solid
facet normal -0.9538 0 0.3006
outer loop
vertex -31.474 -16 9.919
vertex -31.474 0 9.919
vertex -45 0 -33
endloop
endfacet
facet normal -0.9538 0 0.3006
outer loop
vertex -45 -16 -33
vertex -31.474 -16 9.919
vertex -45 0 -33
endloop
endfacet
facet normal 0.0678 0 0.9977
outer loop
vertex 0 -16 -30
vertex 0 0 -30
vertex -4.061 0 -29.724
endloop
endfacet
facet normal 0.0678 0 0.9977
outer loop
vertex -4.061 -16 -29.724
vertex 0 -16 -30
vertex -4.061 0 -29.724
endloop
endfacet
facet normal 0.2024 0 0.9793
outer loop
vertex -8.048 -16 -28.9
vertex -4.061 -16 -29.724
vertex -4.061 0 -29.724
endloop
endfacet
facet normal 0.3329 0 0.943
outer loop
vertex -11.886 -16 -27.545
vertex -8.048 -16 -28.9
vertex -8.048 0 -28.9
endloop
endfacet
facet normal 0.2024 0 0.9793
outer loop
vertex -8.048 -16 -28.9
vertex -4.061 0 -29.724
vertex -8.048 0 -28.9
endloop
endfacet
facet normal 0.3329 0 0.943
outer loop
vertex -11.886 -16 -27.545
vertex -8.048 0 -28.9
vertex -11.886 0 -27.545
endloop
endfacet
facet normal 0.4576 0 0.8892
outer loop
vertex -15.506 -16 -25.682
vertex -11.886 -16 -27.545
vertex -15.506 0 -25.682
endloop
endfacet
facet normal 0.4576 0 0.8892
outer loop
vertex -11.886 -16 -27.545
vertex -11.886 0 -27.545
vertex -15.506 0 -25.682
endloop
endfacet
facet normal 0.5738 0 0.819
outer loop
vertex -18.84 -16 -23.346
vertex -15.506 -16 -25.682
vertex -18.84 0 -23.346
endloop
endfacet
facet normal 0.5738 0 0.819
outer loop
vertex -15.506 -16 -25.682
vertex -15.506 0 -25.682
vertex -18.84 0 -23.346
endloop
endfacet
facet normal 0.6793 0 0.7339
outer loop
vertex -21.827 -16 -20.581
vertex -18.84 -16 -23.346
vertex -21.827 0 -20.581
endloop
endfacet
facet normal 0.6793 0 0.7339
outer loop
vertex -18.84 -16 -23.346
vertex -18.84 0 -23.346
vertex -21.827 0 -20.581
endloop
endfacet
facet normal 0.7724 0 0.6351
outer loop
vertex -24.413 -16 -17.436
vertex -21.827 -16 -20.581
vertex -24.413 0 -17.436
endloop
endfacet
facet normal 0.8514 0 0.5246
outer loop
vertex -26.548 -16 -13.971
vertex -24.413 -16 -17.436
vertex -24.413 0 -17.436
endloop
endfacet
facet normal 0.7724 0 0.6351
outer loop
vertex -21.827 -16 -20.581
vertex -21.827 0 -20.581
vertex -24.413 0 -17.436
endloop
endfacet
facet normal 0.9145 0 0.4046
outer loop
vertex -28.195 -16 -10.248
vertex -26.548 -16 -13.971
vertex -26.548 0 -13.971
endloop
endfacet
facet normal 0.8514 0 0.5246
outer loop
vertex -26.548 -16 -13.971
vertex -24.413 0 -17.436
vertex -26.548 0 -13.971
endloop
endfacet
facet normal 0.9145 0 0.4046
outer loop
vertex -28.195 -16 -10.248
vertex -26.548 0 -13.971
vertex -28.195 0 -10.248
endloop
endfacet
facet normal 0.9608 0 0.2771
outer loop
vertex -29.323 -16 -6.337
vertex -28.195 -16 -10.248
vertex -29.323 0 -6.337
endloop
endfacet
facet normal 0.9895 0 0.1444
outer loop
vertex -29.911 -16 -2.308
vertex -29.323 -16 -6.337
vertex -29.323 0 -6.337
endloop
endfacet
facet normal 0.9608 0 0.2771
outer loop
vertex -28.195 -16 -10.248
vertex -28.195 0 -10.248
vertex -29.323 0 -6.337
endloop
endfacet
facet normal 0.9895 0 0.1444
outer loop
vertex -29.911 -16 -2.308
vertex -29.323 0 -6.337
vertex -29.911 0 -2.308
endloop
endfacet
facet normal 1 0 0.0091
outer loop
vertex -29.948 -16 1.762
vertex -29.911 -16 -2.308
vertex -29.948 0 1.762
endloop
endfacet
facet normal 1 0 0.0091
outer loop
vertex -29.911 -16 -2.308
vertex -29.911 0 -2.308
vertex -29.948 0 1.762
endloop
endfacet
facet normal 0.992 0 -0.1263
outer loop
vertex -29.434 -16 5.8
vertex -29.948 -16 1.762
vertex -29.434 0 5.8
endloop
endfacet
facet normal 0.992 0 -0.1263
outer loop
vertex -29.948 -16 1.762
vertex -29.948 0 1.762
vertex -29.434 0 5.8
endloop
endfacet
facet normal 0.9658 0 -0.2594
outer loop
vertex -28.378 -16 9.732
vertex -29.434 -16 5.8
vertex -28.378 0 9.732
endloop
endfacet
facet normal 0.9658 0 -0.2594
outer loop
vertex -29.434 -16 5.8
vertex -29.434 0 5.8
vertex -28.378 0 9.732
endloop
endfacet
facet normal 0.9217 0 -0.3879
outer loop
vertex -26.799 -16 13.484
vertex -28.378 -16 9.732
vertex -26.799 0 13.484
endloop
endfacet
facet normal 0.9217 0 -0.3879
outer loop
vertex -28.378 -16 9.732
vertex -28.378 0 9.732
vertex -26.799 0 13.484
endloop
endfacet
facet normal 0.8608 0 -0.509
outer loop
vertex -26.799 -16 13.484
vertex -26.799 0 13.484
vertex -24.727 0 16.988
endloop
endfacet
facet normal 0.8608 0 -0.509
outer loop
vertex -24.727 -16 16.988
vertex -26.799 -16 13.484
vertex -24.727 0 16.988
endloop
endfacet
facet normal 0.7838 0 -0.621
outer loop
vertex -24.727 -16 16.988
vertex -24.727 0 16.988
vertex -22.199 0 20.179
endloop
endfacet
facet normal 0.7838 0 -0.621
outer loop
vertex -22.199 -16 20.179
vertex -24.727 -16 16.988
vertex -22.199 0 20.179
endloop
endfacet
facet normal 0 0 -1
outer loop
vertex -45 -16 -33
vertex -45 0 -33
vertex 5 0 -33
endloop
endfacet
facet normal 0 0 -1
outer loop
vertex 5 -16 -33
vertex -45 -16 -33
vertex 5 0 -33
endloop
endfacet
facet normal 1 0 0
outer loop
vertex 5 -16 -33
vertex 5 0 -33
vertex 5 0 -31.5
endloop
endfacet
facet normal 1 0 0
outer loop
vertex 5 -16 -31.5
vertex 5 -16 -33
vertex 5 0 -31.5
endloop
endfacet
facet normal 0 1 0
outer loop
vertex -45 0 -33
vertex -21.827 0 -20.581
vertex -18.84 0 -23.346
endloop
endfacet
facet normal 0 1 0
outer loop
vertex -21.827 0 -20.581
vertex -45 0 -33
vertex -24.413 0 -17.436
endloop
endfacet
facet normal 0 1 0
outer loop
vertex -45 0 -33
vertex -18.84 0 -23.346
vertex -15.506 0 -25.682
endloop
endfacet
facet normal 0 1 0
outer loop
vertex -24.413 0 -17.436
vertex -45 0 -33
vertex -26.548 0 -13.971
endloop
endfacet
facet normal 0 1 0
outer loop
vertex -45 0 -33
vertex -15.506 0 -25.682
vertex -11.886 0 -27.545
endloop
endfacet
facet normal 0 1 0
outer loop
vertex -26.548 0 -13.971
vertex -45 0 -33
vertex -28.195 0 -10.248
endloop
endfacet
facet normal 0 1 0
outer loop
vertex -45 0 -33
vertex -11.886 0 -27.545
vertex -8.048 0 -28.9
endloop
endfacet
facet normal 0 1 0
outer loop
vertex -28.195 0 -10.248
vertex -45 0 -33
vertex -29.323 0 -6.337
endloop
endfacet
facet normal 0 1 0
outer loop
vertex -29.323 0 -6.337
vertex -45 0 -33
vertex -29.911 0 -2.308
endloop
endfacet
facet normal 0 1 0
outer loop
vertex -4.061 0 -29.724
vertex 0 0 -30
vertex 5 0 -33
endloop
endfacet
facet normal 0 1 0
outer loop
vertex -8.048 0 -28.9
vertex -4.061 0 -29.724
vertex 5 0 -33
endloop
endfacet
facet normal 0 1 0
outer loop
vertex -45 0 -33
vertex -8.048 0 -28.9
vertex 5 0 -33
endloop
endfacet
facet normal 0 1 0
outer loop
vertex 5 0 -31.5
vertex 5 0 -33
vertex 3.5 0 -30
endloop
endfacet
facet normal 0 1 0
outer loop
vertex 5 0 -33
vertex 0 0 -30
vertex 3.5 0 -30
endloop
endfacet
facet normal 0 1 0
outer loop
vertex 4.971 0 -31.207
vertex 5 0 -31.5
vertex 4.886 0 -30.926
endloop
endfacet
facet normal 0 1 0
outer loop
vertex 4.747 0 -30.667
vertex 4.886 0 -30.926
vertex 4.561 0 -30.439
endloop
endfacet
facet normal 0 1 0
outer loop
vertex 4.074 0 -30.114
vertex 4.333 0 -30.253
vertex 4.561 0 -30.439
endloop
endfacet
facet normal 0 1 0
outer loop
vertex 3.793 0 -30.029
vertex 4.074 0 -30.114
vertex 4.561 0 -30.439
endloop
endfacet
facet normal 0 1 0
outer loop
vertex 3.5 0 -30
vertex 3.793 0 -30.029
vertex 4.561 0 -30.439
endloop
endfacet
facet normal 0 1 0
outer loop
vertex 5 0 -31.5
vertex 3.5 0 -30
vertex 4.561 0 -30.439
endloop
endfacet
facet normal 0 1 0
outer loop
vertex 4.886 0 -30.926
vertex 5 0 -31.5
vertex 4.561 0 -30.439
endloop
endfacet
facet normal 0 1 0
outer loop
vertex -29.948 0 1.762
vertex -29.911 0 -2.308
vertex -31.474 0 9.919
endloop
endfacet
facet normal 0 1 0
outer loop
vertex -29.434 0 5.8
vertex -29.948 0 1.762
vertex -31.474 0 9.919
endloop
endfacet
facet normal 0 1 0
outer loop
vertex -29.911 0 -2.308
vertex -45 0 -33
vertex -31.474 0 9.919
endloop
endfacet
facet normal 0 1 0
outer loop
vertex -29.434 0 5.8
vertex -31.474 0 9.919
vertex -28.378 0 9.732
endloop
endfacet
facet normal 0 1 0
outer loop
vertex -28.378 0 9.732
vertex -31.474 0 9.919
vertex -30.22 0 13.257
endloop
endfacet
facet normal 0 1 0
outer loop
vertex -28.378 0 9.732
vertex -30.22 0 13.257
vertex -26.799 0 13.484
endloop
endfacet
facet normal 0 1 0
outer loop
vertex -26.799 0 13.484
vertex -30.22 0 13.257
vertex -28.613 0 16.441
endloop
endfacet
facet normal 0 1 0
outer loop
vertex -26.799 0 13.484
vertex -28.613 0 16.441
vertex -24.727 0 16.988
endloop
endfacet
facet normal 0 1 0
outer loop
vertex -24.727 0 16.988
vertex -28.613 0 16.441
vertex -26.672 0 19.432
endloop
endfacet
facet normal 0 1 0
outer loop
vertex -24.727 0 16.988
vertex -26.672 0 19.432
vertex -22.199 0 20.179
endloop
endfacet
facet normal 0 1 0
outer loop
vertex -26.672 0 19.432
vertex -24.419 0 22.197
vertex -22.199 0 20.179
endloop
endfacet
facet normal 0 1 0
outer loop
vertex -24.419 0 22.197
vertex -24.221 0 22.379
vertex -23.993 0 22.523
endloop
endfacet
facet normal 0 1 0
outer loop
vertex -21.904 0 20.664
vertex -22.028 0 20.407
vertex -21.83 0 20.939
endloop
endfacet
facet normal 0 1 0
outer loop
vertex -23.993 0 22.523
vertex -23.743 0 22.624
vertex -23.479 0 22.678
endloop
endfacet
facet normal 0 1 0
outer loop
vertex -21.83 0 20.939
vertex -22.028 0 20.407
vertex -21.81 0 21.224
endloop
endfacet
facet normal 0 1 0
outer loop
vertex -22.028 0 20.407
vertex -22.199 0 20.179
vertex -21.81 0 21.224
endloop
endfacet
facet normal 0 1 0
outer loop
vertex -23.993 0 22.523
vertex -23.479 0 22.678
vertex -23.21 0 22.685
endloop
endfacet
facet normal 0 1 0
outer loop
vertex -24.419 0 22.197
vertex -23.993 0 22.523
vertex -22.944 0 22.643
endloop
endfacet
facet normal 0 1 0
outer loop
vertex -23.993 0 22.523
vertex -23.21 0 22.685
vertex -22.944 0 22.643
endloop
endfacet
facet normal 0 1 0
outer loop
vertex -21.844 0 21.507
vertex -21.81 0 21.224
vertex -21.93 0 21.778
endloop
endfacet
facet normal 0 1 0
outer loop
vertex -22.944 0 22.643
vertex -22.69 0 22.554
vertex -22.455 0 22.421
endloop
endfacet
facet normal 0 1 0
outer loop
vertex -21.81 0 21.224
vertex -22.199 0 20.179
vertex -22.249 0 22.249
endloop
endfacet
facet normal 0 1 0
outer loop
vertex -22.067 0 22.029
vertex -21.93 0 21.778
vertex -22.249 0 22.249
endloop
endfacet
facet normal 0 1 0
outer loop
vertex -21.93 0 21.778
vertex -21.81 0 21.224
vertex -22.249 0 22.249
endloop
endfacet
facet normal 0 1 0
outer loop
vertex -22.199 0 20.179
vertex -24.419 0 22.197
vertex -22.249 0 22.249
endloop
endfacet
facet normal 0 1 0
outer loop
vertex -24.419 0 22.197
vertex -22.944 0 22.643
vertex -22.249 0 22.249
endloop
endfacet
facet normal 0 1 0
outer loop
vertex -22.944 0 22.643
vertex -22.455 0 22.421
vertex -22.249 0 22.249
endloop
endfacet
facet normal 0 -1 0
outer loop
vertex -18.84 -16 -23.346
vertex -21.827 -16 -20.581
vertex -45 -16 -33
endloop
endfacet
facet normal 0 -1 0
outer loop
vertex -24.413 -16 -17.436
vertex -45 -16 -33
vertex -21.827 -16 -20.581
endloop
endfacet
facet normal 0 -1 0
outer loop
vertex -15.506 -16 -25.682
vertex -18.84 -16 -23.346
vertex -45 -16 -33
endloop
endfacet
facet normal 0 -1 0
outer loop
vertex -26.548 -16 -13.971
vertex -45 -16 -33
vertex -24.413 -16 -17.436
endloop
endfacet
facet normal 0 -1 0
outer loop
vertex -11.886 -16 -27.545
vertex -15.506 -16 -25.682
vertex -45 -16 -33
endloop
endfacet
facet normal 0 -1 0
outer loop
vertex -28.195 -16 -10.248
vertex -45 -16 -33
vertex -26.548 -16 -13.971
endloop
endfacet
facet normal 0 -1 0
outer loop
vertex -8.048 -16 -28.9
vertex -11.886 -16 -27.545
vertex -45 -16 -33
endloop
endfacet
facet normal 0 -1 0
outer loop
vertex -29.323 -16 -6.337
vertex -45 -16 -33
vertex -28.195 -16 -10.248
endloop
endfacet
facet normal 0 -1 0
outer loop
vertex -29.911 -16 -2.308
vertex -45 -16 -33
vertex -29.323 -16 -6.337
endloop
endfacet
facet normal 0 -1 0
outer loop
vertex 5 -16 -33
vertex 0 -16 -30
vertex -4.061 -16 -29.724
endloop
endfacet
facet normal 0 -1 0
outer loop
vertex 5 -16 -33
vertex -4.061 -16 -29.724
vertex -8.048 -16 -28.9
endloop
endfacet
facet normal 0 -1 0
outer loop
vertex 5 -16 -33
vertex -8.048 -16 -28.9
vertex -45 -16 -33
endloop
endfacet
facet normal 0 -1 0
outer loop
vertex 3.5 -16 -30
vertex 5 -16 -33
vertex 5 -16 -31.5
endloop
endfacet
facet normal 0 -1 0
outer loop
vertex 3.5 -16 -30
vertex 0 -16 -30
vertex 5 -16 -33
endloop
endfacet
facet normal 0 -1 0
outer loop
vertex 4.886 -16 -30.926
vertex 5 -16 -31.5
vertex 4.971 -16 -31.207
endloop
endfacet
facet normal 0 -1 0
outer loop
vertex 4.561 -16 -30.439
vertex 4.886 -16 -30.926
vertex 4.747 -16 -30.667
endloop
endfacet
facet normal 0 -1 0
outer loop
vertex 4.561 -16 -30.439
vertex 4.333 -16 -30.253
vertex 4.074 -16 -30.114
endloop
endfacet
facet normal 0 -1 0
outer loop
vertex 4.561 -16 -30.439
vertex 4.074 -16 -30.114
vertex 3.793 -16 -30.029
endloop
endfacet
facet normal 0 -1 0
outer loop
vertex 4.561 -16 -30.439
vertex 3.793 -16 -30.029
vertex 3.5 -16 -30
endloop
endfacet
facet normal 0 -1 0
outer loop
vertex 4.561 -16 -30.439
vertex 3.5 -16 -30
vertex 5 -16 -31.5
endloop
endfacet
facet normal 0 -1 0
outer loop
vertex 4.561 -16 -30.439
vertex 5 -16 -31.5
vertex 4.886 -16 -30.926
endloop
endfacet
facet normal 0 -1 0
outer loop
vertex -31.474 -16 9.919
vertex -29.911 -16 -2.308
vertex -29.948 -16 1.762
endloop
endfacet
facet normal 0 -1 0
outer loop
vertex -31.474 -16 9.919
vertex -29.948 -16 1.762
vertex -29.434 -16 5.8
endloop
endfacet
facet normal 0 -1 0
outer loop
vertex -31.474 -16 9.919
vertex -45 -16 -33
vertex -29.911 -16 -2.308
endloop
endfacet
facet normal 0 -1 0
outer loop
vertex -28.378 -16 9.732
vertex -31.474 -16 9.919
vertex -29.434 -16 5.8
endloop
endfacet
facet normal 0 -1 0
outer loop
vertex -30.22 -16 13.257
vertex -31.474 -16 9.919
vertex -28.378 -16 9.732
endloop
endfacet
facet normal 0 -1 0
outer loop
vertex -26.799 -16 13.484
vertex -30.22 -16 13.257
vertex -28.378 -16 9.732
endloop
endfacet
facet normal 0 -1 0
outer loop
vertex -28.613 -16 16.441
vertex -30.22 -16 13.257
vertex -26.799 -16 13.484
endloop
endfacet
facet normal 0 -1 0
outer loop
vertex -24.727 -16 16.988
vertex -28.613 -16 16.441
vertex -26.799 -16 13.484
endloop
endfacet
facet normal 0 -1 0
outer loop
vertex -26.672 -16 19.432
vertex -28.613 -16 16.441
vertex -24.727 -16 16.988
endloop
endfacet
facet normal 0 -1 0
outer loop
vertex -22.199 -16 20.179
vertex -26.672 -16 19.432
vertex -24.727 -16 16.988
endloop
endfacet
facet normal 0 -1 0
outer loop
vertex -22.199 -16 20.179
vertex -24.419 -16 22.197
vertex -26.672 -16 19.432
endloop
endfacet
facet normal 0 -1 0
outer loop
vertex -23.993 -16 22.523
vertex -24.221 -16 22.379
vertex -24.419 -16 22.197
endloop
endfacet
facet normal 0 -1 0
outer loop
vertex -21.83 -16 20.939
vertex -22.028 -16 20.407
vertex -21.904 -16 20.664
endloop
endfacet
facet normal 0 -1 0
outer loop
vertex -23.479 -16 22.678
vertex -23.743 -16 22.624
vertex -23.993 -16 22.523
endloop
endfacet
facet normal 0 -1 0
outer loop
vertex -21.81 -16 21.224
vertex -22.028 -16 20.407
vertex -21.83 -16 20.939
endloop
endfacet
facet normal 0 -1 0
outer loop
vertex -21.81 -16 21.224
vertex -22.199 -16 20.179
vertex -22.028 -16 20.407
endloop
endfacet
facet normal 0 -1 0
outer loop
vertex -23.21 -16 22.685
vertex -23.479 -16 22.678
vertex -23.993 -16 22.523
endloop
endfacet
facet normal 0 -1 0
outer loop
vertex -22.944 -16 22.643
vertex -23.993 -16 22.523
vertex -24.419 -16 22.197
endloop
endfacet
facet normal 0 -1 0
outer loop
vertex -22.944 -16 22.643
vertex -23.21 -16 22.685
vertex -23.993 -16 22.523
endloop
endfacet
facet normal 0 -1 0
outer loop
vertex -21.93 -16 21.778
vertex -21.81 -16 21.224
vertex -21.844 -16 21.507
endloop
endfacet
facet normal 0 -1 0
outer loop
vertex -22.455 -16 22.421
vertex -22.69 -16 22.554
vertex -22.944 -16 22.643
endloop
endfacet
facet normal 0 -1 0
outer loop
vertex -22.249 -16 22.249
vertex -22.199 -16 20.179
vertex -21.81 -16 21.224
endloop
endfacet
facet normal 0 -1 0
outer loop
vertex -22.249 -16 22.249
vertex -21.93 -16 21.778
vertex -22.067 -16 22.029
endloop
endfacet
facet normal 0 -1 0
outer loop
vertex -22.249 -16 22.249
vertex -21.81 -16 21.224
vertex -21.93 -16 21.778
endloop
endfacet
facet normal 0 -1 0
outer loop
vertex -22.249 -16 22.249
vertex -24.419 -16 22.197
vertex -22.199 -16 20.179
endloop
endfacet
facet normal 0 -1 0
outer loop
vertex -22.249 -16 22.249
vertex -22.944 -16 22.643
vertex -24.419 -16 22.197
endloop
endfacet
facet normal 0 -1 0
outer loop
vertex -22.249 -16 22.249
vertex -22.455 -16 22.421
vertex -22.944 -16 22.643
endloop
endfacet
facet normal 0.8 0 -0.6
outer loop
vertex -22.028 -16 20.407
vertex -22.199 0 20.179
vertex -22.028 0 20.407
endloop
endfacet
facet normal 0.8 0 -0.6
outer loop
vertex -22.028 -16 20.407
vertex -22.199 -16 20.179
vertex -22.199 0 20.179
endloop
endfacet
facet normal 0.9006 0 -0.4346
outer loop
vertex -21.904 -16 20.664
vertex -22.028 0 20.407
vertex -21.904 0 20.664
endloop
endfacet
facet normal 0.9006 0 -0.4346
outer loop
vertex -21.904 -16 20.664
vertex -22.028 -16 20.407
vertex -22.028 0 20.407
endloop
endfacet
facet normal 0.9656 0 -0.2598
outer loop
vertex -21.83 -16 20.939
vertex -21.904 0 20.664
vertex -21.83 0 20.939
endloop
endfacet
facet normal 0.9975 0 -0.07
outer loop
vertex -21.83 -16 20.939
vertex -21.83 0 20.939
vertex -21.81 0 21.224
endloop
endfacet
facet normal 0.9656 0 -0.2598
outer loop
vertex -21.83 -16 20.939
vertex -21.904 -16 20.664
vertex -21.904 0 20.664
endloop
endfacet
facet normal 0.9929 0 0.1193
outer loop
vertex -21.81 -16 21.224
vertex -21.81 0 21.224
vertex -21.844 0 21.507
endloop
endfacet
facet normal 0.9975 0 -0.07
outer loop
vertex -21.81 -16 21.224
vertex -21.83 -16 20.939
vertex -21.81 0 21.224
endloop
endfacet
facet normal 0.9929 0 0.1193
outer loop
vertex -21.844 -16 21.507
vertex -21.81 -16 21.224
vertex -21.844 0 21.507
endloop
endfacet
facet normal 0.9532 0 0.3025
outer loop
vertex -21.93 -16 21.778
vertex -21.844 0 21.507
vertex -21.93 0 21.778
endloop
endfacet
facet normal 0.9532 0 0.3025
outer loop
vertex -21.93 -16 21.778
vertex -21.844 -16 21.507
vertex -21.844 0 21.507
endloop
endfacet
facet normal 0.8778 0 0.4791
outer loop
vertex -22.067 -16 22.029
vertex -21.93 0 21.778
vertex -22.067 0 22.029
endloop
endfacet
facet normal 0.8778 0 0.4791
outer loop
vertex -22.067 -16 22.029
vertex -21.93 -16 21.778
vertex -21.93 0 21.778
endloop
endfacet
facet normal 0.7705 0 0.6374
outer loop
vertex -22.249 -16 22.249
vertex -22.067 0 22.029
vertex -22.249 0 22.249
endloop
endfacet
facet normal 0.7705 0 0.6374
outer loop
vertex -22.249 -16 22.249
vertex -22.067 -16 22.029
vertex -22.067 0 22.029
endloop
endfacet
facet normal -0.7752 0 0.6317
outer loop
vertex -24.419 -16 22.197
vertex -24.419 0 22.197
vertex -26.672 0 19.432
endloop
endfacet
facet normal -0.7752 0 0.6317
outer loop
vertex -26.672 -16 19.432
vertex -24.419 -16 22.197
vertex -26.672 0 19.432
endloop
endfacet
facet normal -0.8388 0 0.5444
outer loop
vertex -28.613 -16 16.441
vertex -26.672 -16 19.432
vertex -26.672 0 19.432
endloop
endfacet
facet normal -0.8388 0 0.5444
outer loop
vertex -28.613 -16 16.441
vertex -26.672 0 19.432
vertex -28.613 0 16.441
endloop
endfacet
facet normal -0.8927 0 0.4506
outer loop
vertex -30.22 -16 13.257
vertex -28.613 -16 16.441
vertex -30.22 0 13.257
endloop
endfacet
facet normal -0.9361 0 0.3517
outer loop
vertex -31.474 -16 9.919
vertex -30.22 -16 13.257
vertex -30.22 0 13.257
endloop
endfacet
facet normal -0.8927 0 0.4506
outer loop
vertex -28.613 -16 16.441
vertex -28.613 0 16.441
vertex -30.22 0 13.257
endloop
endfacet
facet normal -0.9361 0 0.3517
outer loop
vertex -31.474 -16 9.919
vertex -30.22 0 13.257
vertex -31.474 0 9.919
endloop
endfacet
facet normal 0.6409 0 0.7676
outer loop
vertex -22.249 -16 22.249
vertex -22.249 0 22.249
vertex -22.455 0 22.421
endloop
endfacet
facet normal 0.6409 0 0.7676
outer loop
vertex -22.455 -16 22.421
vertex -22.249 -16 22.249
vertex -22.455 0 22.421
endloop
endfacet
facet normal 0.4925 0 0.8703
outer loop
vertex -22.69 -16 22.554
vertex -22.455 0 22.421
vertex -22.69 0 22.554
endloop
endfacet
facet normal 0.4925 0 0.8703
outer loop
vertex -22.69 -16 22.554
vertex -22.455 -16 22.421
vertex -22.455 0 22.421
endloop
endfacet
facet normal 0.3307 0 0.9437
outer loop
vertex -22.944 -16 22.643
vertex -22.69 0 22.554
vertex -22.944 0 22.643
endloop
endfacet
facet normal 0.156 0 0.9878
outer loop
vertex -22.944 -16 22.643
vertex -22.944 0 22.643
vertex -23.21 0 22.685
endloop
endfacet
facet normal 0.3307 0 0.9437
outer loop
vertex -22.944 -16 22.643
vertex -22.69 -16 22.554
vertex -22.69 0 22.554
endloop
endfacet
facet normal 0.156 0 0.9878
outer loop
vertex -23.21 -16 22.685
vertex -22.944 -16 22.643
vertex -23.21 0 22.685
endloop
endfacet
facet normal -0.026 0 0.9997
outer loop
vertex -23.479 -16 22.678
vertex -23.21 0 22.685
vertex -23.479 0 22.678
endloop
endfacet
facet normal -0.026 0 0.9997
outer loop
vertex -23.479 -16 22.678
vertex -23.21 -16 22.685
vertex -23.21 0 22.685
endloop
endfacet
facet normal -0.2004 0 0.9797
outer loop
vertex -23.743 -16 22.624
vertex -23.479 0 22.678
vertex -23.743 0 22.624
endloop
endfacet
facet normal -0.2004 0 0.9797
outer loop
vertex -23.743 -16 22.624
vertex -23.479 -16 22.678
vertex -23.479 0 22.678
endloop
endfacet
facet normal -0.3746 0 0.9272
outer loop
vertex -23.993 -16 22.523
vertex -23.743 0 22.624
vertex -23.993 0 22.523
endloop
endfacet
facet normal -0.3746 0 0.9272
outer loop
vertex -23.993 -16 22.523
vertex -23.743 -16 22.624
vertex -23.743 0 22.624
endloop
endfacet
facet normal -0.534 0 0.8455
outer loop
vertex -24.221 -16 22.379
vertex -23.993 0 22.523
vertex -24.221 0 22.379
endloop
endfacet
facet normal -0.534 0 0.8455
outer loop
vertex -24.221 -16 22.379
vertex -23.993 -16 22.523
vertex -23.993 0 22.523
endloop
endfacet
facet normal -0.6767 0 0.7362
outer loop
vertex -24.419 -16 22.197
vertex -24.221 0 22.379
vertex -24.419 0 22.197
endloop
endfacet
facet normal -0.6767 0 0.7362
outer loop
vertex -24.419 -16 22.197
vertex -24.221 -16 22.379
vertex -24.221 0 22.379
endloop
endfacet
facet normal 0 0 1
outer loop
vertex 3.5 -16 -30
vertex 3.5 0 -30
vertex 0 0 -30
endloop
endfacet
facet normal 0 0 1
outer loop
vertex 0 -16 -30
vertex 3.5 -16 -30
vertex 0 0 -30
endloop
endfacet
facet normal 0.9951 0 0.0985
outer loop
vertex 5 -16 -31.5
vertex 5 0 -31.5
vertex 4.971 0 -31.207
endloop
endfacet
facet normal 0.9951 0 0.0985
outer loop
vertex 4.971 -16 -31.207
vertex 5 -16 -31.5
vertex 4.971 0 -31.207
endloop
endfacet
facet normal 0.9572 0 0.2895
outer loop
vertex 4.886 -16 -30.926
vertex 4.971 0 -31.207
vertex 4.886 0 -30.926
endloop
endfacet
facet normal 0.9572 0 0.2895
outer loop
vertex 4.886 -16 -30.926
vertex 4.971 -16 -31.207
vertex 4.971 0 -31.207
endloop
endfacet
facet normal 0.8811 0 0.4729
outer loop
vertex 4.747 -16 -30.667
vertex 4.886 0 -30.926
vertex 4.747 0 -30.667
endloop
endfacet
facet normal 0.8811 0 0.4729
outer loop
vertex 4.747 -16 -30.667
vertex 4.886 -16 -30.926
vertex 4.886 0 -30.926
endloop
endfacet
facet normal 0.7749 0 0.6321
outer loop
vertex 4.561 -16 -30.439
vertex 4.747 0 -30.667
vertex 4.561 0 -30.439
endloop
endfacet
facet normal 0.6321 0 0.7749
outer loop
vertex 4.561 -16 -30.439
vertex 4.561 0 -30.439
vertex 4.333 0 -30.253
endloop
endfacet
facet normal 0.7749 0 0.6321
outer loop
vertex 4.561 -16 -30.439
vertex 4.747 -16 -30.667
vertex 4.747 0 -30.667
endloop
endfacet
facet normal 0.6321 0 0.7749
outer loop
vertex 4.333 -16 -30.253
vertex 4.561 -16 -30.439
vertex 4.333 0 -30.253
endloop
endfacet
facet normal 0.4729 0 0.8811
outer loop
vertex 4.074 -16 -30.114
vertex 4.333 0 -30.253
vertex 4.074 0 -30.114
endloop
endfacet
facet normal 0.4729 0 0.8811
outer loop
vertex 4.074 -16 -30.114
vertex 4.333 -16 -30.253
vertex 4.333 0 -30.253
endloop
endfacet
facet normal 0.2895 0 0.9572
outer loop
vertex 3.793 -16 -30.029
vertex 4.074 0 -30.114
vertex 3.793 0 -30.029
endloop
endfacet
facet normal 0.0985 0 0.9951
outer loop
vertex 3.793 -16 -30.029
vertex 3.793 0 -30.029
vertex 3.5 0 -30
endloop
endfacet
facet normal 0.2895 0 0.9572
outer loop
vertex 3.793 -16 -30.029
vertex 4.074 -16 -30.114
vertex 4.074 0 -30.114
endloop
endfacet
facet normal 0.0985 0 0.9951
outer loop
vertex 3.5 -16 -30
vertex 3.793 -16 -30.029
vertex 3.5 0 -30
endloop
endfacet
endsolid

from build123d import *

# Parameters (mm, degrees)
F1_DEPTH = 16
F2_R     = 1.49999


# Not quite as in the source:
# - a fillet or chamfer is up to 0.001 mm smaller than in the source, because OpenCascade refuses the exact size


with BuildPart() as f1:
    # F0 (on Front) → F1 (new body)
    with BuildSketch(Plane.XZ):
        with BuildLine():
            ThreePointArc((0, -33), (-26.6113648632, -19.5150008997), (-31.4739884393, 9.9190751445))
            Line((-31.4739884393, 9.9190751445), (-45, -33))
            Line((-45, -33), (0, -33))
        make_face()
        with BuildLine():
            Line((5, -30), (0, -30))
            ThreePointArc((0, -30), (-27.7163859753, -11.480502971), (-21.2132034356, 21.2132034356))
            Line((-21.2132034356, 21.2132034356), (-23.3345237792, 23.3345237792))
            ThreePointArc((-23.3345237792, 23.3345237792), (-28.213238354, 17.1176278024), (-31.4739884393, 9.9190751445))
            ThreePointArc((-31.4739884393, 9.9190751445), (-26.6113648632, -19.5150008997), (0, -33))
            ThreePointArc((0, -33), (2.5072470561, -32.9046153632), (5, -32.6190128606))
            Line((5, -32.6190128606), (5, -30))
        make_face()
        with BuildLine():
            Line((5, -33), (5, -32.6190128606))
            ThreePointArc((5, -32.6190128606), (2.5072470561, -32.9046153632), (0, -33))
            Line((0, -33), (5, -33))
        make_face()
    extrude(amount=F1_DEPTH)

    # F2 (radius 1.5 in the source; OpenCascade refuses exactly that, so slightly less here)
    f2_edges = [f1.edges().sort_by_distance(p)[0] for p in [
        (-21.213203, -8, 21.213203),
        (-23.334524, -8, 23.334524),
        (5, -8, -30),
    ]]
    fillet(f2_edges, radius=F2_R)


solid = f1.part
